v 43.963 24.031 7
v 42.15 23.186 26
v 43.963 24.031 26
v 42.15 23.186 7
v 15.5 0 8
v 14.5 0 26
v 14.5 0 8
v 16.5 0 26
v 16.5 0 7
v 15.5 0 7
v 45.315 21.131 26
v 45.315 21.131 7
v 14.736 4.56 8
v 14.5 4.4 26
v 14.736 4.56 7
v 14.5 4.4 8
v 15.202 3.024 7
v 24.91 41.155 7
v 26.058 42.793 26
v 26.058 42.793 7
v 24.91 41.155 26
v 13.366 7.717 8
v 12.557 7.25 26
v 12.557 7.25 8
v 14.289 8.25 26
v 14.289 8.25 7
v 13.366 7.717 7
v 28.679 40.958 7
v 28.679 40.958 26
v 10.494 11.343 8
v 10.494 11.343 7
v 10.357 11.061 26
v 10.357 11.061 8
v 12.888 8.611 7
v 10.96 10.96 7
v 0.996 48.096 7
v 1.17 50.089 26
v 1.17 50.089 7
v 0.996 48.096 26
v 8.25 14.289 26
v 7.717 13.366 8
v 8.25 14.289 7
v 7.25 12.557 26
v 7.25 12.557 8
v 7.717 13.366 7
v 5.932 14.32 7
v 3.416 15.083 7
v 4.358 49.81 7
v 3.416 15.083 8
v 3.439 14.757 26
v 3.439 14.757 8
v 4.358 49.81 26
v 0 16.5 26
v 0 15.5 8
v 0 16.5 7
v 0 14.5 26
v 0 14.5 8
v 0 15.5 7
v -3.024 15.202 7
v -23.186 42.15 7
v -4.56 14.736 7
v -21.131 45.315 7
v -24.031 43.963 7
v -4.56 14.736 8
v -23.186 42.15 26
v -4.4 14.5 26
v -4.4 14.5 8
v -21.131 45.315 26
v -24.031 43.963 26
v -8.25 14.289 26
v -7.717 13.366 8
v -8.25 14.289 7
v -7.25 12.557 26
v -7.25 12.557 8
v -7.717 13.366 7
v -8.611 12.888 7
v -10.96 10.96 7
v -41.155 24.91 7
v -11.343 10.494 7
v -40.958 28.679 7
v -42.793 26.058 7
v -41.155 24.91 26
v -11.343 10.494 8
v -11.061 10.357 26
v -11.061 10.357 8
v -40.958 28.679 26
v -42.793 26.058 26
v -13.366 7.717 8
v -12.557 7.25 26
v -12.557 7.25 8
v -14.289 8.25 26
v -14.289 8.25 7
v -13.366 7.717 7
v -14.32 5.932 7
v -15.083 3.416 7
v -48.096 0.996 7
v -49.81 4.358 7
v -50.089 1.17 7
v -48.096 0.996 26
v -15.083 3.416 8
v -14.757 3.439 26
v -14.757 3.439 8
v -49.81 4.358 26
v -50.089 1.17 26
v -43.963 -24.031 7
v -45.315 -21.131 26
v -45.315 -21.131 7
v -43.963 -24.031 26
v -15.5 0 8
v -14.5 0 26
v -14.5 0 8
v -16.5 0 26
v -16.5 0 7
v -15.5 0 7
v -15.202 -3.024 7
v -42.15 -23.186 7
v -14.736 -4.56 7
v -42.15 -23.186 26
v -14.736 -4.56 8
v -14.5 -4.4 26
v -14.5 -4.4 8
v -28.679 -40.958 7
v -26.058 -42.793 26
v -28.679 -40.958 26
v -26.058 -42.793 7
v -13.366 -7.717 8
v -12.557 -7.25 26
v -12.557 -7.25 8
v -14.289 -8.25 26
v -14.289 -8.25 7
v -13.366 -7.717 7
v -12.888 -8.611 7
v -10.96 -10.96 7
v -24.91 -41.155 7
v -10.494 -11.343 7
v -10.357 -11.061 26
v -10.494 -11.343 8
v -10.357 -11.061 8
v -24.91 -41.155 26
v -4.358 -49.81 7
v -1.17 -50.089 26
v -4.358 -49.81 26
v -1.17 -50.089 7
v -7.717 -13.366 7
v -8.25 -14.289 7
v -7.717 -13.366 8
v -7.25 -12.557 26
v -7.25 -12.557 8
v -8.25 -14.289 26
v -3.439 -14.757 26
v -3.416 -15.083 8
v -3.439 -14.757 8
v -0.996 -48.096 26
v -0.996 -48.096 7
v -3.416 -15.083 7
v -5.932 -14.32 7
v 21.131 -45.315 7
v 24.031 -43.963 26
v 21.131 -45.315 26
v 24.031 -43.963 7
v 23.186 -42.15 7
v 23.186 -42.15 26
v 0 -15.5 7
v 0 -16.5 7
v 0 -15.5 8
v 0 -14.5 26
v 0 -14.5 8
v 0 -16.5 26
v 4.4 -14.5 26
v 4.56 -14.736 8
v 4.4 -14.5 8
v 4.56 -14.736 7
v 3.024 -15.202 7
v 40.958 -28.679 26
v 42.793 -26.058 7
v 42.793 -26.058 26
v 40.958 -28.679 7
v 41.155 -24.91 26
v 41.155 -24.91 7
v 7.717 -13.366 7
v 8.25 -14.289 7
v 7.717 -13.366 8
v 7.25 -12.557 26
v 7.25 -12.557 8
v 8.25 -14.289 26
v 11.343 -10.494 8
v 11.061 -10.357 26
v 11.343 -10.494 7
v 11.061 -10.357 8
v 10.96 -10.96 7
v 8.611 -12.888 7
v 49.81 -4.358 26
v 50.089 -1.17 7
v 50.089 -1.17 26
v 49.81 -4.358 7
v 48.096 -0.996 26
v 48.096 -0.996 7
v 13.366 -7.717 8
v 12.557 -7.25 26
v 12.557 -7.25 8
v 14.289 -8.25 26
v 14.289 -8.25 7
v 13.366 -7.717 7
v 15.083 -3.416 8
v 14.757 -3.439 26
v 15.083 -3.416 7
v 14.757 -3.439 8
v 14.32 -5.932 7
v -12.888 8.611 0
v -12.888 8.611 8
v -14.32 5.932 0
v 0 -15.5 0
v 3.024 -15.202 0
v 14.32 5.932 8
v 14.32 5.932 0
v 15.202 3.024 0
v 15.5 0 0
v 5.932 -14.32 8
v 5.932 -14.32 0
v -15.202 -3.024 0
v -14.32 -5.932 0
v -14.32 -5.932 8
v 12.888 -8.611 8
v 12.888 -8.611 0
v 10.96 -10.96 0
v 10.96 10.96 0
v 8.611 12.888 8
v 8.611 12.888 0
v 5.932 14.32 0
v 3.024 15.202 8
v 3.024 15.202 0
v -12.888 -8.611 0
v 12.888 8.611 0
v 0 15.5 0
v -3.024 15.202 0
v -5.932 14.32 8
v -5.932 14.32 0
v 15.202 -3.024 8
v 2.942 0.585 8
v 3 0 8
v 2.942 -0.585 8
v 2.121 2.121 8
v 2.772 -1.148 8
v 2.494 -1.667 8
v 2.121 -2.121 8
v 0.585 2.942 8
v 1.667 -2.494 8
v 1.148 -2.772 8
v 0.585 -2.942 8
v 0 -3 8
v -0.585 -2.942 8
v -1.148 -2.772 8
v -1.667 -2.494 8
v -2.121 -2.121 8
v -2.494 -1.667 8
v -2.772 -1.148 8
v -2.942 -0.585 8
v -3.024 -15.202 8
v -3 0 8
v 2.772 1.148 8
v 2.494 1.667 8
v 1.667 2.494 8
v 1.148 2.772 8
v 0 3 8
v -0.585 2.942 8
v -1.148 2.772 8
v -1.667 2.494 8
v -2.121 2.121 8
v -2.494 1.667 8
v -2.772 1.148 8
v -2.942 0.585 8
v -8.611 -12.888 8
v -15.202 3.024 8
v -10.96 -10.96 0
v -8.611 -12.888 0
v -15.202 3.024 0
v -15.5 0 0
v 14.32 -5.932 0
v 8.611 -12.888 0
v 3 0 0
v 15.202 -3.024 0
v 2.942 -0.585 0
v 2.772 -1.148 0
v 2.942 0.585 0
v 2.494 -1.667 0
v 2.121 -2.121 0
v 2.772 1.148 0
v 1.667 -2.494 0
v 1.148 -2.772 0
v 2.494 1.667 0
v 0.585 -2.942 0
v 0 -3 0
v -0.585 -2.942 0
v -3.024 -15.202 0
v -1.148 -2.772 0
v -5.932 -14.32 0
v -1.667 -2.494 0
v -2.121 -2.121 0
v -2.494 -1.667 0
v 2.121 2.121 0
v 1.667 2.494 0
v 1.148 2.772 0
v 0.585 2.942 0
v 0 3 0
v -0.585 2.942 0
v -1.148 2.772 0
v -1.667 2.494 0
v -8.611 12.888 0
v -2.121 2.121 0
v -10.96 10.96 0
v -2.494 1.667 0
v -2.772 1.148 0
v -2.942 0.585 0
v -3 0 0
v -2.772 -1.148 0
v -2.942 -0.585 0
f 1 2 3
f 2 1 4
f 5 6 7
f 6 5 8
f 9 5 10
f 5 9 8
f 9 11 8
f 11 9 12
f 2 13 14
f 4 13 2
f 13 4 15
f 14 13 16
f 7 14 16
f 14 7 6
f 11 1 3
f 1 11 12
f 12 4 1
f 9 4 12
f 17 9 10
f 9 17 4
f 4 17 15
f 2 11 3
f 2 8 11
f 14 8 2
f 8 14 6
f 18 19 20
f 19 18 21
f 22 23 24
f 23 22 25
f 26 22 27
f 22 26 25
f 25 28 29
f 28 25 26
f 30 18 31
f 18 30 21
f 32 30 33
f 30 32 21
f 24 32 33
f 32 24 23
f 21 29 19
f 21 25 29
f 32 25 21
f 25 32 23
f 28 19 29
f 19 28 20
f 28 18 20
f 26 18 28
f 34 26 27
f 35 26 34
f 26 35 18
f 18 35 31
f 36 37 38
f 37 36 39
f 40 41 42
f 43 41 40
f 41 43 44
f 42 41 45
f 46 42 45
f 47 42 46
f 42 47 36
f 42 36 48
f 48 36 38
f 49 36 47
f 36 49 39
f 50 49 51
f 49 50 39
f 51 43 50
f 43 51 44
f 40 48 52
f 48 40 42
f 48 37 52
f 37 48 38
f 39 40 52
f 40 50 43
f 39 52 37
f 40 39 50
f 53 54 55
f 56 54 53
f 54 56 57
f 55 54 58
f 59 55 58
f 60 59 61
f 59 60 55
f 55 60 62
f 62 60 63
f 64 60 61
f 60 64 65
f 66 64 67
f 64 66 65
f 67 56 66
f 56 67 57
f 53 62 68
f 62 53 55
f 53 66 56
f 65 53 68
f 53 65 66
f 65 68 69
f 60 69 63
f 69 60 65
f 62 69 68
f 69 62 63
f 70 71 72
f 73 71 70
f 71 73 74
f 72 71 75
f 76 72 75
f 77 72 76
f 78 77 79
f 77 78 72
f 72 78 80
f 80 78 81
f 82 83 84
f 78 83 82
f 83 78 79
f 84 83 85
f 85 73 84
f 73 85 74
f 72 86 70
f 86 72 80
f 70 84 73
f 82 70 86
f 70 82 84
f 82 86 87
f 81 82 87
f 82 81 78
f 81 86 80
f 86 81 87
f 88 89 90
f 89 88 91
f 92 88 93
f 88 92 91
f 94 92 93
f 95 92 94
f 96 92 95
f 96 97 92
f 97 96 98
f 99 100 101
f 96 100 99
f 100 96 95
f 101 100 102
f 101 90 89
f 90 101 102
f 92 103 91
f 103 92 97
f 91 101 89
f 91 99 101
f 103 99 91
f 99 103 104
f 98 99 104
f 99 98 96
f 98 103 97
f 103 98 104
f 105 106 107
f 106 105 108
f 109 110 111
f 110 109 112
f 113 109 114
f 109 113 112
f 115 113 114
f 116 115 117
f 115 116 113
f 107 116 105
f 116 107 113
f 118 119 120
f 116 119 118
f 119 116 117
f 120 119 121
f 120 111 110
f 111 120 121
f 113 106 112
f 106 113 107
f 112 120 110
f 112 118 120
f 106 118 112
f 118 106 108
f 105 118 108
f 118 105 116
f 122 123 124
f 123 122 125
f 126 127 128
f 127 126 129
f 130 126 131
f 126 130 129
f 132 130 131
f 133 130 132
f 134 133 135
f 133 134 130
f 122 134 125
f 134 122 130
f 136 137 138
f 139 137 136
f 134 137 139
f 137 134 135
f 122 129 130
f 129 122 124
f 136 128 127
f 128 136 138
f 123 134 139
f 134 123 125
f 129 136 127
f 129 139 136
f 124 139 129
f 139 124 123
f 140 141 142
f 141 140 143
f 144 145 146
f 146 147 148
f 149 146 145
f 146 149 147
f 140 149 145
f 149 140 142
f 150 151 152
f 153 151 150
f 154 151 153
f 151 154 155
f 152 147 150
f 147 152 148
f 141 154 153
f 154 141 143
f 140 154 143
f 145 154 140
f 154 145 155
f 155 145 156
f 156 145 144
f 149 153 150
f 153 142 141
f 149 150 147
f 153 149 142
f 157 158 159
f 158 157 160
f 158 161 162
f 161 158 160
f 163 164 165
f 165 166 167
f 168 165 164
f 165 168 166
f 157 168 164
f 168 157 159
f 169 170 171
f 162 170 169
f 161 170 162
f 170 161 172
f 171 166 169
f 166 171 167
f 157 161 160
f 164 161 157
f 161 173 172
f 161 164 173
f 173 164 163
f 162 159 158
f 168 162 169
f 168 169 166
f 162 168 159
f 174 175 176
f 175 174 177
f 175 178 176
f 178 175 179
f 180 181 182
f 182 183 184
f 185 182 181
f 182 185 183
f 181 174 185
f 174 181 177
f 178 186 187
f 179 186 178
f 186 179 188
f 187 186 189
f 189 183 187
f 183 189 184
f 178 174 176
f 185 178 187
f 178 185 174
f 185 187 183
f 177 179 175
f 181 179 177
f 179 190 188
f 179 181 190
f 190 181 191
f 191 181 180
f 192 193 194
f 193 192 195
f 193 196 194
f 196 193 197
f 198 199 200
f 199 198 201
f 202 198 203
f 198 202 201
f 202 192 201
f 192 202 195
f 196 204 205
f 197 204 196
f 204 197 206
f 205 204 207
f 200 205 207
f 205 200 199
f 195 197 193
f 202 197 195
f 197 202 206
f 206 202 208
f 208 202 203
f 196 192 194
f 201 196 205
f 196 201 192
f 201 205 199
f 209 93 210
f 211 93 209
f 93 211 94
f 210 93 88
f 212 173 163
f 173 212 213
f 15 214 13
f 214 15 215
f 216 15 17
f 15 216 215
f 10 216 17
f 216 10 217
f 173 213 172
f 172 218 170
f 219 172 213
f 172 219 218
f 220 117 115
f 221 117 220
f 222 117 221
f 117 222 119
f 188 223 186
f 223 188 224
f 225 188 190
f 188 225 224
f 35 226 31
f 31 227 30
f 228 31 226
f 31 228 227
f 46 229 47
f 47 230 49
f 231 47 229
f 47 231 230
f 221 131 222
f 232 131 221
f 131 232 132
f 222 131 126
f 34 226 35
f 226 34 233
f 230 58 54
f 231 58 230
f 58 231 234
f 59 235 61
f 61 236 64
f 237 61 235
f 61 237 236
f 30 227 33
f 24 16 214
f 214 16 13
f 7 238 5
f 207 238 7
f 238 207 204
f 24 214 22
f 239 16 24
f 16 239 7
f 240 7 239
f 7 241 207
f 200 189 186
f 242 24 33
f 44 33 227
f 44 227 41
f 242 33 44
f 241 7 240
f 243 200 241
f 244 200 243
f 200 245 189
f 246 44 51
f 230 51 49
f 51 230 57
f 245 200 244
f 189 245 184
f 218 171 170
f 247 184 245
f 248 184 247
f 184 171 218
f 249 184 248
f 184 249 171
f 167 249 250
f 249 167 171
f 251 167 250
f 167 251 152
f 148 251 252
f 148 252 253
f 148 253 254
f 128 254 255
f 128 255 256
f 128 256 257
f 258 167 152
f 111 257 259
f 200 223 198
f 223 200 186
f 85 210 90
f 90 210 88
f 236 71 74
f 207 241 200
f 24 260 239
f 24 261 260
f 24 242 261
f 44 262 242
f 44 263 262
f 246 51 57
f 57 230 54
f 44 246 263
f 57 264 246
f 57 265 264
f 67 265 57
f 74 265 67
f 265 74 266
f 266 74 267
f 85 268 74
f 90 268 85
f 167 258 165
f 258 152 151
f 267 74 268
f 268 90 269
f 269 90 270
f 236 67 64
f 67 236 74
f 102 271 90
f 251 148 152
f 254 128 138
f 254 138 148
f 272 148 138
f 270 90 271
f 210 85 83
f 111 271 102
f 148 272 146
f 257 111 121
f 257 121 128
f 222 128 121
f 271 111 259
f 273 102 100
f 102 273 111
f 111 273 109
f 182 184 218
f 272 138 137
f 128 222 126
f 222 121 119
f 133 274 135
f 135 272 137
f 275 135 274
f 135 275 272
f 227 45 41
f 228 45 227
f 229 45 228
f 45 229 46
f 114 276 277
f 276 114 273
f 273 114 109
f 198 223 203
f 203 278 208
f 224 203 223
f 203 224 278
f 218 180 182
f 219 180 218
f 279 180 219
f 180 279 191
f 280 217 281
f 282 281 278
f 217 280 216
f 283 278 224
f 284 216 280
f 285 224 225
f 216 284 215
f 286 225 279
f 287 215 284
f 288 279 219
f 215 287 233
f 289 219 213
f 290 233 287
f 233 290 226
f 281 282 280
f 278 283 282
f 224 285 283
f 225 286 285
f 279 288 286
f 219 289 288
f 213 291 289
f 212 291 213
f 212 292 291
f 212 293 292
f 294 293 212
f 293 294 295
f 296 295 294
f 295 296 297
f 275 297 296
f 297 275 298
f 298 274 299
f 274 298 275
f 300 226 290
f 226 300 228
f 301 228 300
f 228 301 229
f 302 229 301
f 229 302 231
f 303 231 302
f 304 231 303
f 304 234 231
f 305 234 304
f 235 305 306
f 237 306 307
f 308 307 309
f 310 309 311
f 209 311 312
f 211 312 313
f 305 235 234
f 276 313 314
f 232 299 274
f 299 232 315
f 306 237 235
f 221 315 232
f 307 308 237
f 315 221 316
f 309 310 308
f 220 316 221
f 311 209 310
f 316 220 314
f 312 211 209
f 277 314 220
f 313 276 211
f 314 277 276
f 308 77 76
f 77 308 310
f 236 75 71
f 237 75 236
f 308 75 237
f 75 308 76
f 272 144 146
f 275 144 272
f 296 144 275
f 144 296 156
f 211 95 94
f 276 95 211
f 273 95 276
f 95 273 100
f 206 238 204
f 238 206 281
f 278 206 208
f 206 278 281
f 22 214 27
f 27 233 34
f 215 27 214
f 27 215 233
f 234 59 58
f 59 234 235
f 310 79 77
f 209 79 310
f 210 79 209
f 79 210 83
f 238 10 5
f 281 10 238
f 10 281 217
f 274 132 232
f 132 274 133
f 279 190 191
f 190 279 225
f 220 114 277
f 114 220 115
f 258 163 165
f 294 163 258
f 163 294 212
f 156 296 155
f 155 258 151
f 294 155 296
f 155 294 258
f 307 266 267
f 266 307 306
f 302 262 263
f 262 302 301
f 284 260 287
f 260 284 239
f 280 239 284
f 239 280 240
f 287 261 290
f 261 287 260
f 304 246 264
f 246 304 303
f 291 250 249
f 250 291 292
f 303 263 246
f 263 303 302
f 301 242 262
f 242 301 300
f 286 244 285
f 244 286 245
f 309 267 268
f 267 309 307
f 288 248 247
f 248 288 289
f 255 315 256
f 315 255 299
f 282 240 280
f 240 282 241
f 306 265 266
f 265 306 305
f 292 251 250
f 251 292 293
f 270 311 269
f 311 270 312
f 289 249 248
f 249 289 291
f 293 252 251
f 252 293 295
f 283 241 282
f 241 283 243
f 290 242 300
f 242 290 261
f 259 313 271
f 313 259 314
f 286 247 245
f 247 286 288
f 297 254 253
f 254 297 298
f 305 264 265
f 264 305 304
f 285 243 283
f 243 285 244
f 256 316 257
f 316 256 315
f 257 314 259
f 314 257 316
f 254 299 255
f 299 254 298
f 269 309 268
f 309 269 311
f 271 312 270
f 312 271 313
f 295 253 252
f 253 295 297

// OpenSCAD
$fn = 32;

// ----------------------------------------------------------------------
// Impeller: 100 mm, 12 blades, 26 mm tall
// ----------------------------------------------------------------------

// --- parameters (mm) ---
boss_d = 31;              // hub diameter
boss_h = 8;               // hub height
rotor_d = 100;            // outer diameter over the blades
vane_count = 12;          // number of blades
blade_t = 2;              // blade thickness
blade_h = 18;             // blade height
blade_in_r = 14.5;        // blade root radius
blade_out_r = 48;         // blade tip radius
sweep = 25;               // blade sweep, degrees
bore_d = 6;               // shaft bore

module hub() {
  cylinder(h = boss_h, d = boss_d);
}

module blade() {
  /* blade swept between two boxes: hull of the root and the tip section */
  hull() {
    translate([blade_in_r, 0, boss_h - 1])
      cube([blade_t, blade_t * 2.2, blade_h + 1], center = false);
    rotate([0, 0, sweep])
      translate([blade_out_r, 0, boss_h - 1])
        cube([blade_t, blade_t * 1.6, blade_h + 1], center = false);
  }
}

module blades() {
  for (i = [0 : vane_count - 1])
    rotate([0, 0, i * 360 / vane_count]) blade();
}

difference() {
  union() {
    hub();
    blades();
  }
  translate([0, 0, -1]) cylinder(h = boss_h + blade_h + 0 + 3, d = bore_d);
}
